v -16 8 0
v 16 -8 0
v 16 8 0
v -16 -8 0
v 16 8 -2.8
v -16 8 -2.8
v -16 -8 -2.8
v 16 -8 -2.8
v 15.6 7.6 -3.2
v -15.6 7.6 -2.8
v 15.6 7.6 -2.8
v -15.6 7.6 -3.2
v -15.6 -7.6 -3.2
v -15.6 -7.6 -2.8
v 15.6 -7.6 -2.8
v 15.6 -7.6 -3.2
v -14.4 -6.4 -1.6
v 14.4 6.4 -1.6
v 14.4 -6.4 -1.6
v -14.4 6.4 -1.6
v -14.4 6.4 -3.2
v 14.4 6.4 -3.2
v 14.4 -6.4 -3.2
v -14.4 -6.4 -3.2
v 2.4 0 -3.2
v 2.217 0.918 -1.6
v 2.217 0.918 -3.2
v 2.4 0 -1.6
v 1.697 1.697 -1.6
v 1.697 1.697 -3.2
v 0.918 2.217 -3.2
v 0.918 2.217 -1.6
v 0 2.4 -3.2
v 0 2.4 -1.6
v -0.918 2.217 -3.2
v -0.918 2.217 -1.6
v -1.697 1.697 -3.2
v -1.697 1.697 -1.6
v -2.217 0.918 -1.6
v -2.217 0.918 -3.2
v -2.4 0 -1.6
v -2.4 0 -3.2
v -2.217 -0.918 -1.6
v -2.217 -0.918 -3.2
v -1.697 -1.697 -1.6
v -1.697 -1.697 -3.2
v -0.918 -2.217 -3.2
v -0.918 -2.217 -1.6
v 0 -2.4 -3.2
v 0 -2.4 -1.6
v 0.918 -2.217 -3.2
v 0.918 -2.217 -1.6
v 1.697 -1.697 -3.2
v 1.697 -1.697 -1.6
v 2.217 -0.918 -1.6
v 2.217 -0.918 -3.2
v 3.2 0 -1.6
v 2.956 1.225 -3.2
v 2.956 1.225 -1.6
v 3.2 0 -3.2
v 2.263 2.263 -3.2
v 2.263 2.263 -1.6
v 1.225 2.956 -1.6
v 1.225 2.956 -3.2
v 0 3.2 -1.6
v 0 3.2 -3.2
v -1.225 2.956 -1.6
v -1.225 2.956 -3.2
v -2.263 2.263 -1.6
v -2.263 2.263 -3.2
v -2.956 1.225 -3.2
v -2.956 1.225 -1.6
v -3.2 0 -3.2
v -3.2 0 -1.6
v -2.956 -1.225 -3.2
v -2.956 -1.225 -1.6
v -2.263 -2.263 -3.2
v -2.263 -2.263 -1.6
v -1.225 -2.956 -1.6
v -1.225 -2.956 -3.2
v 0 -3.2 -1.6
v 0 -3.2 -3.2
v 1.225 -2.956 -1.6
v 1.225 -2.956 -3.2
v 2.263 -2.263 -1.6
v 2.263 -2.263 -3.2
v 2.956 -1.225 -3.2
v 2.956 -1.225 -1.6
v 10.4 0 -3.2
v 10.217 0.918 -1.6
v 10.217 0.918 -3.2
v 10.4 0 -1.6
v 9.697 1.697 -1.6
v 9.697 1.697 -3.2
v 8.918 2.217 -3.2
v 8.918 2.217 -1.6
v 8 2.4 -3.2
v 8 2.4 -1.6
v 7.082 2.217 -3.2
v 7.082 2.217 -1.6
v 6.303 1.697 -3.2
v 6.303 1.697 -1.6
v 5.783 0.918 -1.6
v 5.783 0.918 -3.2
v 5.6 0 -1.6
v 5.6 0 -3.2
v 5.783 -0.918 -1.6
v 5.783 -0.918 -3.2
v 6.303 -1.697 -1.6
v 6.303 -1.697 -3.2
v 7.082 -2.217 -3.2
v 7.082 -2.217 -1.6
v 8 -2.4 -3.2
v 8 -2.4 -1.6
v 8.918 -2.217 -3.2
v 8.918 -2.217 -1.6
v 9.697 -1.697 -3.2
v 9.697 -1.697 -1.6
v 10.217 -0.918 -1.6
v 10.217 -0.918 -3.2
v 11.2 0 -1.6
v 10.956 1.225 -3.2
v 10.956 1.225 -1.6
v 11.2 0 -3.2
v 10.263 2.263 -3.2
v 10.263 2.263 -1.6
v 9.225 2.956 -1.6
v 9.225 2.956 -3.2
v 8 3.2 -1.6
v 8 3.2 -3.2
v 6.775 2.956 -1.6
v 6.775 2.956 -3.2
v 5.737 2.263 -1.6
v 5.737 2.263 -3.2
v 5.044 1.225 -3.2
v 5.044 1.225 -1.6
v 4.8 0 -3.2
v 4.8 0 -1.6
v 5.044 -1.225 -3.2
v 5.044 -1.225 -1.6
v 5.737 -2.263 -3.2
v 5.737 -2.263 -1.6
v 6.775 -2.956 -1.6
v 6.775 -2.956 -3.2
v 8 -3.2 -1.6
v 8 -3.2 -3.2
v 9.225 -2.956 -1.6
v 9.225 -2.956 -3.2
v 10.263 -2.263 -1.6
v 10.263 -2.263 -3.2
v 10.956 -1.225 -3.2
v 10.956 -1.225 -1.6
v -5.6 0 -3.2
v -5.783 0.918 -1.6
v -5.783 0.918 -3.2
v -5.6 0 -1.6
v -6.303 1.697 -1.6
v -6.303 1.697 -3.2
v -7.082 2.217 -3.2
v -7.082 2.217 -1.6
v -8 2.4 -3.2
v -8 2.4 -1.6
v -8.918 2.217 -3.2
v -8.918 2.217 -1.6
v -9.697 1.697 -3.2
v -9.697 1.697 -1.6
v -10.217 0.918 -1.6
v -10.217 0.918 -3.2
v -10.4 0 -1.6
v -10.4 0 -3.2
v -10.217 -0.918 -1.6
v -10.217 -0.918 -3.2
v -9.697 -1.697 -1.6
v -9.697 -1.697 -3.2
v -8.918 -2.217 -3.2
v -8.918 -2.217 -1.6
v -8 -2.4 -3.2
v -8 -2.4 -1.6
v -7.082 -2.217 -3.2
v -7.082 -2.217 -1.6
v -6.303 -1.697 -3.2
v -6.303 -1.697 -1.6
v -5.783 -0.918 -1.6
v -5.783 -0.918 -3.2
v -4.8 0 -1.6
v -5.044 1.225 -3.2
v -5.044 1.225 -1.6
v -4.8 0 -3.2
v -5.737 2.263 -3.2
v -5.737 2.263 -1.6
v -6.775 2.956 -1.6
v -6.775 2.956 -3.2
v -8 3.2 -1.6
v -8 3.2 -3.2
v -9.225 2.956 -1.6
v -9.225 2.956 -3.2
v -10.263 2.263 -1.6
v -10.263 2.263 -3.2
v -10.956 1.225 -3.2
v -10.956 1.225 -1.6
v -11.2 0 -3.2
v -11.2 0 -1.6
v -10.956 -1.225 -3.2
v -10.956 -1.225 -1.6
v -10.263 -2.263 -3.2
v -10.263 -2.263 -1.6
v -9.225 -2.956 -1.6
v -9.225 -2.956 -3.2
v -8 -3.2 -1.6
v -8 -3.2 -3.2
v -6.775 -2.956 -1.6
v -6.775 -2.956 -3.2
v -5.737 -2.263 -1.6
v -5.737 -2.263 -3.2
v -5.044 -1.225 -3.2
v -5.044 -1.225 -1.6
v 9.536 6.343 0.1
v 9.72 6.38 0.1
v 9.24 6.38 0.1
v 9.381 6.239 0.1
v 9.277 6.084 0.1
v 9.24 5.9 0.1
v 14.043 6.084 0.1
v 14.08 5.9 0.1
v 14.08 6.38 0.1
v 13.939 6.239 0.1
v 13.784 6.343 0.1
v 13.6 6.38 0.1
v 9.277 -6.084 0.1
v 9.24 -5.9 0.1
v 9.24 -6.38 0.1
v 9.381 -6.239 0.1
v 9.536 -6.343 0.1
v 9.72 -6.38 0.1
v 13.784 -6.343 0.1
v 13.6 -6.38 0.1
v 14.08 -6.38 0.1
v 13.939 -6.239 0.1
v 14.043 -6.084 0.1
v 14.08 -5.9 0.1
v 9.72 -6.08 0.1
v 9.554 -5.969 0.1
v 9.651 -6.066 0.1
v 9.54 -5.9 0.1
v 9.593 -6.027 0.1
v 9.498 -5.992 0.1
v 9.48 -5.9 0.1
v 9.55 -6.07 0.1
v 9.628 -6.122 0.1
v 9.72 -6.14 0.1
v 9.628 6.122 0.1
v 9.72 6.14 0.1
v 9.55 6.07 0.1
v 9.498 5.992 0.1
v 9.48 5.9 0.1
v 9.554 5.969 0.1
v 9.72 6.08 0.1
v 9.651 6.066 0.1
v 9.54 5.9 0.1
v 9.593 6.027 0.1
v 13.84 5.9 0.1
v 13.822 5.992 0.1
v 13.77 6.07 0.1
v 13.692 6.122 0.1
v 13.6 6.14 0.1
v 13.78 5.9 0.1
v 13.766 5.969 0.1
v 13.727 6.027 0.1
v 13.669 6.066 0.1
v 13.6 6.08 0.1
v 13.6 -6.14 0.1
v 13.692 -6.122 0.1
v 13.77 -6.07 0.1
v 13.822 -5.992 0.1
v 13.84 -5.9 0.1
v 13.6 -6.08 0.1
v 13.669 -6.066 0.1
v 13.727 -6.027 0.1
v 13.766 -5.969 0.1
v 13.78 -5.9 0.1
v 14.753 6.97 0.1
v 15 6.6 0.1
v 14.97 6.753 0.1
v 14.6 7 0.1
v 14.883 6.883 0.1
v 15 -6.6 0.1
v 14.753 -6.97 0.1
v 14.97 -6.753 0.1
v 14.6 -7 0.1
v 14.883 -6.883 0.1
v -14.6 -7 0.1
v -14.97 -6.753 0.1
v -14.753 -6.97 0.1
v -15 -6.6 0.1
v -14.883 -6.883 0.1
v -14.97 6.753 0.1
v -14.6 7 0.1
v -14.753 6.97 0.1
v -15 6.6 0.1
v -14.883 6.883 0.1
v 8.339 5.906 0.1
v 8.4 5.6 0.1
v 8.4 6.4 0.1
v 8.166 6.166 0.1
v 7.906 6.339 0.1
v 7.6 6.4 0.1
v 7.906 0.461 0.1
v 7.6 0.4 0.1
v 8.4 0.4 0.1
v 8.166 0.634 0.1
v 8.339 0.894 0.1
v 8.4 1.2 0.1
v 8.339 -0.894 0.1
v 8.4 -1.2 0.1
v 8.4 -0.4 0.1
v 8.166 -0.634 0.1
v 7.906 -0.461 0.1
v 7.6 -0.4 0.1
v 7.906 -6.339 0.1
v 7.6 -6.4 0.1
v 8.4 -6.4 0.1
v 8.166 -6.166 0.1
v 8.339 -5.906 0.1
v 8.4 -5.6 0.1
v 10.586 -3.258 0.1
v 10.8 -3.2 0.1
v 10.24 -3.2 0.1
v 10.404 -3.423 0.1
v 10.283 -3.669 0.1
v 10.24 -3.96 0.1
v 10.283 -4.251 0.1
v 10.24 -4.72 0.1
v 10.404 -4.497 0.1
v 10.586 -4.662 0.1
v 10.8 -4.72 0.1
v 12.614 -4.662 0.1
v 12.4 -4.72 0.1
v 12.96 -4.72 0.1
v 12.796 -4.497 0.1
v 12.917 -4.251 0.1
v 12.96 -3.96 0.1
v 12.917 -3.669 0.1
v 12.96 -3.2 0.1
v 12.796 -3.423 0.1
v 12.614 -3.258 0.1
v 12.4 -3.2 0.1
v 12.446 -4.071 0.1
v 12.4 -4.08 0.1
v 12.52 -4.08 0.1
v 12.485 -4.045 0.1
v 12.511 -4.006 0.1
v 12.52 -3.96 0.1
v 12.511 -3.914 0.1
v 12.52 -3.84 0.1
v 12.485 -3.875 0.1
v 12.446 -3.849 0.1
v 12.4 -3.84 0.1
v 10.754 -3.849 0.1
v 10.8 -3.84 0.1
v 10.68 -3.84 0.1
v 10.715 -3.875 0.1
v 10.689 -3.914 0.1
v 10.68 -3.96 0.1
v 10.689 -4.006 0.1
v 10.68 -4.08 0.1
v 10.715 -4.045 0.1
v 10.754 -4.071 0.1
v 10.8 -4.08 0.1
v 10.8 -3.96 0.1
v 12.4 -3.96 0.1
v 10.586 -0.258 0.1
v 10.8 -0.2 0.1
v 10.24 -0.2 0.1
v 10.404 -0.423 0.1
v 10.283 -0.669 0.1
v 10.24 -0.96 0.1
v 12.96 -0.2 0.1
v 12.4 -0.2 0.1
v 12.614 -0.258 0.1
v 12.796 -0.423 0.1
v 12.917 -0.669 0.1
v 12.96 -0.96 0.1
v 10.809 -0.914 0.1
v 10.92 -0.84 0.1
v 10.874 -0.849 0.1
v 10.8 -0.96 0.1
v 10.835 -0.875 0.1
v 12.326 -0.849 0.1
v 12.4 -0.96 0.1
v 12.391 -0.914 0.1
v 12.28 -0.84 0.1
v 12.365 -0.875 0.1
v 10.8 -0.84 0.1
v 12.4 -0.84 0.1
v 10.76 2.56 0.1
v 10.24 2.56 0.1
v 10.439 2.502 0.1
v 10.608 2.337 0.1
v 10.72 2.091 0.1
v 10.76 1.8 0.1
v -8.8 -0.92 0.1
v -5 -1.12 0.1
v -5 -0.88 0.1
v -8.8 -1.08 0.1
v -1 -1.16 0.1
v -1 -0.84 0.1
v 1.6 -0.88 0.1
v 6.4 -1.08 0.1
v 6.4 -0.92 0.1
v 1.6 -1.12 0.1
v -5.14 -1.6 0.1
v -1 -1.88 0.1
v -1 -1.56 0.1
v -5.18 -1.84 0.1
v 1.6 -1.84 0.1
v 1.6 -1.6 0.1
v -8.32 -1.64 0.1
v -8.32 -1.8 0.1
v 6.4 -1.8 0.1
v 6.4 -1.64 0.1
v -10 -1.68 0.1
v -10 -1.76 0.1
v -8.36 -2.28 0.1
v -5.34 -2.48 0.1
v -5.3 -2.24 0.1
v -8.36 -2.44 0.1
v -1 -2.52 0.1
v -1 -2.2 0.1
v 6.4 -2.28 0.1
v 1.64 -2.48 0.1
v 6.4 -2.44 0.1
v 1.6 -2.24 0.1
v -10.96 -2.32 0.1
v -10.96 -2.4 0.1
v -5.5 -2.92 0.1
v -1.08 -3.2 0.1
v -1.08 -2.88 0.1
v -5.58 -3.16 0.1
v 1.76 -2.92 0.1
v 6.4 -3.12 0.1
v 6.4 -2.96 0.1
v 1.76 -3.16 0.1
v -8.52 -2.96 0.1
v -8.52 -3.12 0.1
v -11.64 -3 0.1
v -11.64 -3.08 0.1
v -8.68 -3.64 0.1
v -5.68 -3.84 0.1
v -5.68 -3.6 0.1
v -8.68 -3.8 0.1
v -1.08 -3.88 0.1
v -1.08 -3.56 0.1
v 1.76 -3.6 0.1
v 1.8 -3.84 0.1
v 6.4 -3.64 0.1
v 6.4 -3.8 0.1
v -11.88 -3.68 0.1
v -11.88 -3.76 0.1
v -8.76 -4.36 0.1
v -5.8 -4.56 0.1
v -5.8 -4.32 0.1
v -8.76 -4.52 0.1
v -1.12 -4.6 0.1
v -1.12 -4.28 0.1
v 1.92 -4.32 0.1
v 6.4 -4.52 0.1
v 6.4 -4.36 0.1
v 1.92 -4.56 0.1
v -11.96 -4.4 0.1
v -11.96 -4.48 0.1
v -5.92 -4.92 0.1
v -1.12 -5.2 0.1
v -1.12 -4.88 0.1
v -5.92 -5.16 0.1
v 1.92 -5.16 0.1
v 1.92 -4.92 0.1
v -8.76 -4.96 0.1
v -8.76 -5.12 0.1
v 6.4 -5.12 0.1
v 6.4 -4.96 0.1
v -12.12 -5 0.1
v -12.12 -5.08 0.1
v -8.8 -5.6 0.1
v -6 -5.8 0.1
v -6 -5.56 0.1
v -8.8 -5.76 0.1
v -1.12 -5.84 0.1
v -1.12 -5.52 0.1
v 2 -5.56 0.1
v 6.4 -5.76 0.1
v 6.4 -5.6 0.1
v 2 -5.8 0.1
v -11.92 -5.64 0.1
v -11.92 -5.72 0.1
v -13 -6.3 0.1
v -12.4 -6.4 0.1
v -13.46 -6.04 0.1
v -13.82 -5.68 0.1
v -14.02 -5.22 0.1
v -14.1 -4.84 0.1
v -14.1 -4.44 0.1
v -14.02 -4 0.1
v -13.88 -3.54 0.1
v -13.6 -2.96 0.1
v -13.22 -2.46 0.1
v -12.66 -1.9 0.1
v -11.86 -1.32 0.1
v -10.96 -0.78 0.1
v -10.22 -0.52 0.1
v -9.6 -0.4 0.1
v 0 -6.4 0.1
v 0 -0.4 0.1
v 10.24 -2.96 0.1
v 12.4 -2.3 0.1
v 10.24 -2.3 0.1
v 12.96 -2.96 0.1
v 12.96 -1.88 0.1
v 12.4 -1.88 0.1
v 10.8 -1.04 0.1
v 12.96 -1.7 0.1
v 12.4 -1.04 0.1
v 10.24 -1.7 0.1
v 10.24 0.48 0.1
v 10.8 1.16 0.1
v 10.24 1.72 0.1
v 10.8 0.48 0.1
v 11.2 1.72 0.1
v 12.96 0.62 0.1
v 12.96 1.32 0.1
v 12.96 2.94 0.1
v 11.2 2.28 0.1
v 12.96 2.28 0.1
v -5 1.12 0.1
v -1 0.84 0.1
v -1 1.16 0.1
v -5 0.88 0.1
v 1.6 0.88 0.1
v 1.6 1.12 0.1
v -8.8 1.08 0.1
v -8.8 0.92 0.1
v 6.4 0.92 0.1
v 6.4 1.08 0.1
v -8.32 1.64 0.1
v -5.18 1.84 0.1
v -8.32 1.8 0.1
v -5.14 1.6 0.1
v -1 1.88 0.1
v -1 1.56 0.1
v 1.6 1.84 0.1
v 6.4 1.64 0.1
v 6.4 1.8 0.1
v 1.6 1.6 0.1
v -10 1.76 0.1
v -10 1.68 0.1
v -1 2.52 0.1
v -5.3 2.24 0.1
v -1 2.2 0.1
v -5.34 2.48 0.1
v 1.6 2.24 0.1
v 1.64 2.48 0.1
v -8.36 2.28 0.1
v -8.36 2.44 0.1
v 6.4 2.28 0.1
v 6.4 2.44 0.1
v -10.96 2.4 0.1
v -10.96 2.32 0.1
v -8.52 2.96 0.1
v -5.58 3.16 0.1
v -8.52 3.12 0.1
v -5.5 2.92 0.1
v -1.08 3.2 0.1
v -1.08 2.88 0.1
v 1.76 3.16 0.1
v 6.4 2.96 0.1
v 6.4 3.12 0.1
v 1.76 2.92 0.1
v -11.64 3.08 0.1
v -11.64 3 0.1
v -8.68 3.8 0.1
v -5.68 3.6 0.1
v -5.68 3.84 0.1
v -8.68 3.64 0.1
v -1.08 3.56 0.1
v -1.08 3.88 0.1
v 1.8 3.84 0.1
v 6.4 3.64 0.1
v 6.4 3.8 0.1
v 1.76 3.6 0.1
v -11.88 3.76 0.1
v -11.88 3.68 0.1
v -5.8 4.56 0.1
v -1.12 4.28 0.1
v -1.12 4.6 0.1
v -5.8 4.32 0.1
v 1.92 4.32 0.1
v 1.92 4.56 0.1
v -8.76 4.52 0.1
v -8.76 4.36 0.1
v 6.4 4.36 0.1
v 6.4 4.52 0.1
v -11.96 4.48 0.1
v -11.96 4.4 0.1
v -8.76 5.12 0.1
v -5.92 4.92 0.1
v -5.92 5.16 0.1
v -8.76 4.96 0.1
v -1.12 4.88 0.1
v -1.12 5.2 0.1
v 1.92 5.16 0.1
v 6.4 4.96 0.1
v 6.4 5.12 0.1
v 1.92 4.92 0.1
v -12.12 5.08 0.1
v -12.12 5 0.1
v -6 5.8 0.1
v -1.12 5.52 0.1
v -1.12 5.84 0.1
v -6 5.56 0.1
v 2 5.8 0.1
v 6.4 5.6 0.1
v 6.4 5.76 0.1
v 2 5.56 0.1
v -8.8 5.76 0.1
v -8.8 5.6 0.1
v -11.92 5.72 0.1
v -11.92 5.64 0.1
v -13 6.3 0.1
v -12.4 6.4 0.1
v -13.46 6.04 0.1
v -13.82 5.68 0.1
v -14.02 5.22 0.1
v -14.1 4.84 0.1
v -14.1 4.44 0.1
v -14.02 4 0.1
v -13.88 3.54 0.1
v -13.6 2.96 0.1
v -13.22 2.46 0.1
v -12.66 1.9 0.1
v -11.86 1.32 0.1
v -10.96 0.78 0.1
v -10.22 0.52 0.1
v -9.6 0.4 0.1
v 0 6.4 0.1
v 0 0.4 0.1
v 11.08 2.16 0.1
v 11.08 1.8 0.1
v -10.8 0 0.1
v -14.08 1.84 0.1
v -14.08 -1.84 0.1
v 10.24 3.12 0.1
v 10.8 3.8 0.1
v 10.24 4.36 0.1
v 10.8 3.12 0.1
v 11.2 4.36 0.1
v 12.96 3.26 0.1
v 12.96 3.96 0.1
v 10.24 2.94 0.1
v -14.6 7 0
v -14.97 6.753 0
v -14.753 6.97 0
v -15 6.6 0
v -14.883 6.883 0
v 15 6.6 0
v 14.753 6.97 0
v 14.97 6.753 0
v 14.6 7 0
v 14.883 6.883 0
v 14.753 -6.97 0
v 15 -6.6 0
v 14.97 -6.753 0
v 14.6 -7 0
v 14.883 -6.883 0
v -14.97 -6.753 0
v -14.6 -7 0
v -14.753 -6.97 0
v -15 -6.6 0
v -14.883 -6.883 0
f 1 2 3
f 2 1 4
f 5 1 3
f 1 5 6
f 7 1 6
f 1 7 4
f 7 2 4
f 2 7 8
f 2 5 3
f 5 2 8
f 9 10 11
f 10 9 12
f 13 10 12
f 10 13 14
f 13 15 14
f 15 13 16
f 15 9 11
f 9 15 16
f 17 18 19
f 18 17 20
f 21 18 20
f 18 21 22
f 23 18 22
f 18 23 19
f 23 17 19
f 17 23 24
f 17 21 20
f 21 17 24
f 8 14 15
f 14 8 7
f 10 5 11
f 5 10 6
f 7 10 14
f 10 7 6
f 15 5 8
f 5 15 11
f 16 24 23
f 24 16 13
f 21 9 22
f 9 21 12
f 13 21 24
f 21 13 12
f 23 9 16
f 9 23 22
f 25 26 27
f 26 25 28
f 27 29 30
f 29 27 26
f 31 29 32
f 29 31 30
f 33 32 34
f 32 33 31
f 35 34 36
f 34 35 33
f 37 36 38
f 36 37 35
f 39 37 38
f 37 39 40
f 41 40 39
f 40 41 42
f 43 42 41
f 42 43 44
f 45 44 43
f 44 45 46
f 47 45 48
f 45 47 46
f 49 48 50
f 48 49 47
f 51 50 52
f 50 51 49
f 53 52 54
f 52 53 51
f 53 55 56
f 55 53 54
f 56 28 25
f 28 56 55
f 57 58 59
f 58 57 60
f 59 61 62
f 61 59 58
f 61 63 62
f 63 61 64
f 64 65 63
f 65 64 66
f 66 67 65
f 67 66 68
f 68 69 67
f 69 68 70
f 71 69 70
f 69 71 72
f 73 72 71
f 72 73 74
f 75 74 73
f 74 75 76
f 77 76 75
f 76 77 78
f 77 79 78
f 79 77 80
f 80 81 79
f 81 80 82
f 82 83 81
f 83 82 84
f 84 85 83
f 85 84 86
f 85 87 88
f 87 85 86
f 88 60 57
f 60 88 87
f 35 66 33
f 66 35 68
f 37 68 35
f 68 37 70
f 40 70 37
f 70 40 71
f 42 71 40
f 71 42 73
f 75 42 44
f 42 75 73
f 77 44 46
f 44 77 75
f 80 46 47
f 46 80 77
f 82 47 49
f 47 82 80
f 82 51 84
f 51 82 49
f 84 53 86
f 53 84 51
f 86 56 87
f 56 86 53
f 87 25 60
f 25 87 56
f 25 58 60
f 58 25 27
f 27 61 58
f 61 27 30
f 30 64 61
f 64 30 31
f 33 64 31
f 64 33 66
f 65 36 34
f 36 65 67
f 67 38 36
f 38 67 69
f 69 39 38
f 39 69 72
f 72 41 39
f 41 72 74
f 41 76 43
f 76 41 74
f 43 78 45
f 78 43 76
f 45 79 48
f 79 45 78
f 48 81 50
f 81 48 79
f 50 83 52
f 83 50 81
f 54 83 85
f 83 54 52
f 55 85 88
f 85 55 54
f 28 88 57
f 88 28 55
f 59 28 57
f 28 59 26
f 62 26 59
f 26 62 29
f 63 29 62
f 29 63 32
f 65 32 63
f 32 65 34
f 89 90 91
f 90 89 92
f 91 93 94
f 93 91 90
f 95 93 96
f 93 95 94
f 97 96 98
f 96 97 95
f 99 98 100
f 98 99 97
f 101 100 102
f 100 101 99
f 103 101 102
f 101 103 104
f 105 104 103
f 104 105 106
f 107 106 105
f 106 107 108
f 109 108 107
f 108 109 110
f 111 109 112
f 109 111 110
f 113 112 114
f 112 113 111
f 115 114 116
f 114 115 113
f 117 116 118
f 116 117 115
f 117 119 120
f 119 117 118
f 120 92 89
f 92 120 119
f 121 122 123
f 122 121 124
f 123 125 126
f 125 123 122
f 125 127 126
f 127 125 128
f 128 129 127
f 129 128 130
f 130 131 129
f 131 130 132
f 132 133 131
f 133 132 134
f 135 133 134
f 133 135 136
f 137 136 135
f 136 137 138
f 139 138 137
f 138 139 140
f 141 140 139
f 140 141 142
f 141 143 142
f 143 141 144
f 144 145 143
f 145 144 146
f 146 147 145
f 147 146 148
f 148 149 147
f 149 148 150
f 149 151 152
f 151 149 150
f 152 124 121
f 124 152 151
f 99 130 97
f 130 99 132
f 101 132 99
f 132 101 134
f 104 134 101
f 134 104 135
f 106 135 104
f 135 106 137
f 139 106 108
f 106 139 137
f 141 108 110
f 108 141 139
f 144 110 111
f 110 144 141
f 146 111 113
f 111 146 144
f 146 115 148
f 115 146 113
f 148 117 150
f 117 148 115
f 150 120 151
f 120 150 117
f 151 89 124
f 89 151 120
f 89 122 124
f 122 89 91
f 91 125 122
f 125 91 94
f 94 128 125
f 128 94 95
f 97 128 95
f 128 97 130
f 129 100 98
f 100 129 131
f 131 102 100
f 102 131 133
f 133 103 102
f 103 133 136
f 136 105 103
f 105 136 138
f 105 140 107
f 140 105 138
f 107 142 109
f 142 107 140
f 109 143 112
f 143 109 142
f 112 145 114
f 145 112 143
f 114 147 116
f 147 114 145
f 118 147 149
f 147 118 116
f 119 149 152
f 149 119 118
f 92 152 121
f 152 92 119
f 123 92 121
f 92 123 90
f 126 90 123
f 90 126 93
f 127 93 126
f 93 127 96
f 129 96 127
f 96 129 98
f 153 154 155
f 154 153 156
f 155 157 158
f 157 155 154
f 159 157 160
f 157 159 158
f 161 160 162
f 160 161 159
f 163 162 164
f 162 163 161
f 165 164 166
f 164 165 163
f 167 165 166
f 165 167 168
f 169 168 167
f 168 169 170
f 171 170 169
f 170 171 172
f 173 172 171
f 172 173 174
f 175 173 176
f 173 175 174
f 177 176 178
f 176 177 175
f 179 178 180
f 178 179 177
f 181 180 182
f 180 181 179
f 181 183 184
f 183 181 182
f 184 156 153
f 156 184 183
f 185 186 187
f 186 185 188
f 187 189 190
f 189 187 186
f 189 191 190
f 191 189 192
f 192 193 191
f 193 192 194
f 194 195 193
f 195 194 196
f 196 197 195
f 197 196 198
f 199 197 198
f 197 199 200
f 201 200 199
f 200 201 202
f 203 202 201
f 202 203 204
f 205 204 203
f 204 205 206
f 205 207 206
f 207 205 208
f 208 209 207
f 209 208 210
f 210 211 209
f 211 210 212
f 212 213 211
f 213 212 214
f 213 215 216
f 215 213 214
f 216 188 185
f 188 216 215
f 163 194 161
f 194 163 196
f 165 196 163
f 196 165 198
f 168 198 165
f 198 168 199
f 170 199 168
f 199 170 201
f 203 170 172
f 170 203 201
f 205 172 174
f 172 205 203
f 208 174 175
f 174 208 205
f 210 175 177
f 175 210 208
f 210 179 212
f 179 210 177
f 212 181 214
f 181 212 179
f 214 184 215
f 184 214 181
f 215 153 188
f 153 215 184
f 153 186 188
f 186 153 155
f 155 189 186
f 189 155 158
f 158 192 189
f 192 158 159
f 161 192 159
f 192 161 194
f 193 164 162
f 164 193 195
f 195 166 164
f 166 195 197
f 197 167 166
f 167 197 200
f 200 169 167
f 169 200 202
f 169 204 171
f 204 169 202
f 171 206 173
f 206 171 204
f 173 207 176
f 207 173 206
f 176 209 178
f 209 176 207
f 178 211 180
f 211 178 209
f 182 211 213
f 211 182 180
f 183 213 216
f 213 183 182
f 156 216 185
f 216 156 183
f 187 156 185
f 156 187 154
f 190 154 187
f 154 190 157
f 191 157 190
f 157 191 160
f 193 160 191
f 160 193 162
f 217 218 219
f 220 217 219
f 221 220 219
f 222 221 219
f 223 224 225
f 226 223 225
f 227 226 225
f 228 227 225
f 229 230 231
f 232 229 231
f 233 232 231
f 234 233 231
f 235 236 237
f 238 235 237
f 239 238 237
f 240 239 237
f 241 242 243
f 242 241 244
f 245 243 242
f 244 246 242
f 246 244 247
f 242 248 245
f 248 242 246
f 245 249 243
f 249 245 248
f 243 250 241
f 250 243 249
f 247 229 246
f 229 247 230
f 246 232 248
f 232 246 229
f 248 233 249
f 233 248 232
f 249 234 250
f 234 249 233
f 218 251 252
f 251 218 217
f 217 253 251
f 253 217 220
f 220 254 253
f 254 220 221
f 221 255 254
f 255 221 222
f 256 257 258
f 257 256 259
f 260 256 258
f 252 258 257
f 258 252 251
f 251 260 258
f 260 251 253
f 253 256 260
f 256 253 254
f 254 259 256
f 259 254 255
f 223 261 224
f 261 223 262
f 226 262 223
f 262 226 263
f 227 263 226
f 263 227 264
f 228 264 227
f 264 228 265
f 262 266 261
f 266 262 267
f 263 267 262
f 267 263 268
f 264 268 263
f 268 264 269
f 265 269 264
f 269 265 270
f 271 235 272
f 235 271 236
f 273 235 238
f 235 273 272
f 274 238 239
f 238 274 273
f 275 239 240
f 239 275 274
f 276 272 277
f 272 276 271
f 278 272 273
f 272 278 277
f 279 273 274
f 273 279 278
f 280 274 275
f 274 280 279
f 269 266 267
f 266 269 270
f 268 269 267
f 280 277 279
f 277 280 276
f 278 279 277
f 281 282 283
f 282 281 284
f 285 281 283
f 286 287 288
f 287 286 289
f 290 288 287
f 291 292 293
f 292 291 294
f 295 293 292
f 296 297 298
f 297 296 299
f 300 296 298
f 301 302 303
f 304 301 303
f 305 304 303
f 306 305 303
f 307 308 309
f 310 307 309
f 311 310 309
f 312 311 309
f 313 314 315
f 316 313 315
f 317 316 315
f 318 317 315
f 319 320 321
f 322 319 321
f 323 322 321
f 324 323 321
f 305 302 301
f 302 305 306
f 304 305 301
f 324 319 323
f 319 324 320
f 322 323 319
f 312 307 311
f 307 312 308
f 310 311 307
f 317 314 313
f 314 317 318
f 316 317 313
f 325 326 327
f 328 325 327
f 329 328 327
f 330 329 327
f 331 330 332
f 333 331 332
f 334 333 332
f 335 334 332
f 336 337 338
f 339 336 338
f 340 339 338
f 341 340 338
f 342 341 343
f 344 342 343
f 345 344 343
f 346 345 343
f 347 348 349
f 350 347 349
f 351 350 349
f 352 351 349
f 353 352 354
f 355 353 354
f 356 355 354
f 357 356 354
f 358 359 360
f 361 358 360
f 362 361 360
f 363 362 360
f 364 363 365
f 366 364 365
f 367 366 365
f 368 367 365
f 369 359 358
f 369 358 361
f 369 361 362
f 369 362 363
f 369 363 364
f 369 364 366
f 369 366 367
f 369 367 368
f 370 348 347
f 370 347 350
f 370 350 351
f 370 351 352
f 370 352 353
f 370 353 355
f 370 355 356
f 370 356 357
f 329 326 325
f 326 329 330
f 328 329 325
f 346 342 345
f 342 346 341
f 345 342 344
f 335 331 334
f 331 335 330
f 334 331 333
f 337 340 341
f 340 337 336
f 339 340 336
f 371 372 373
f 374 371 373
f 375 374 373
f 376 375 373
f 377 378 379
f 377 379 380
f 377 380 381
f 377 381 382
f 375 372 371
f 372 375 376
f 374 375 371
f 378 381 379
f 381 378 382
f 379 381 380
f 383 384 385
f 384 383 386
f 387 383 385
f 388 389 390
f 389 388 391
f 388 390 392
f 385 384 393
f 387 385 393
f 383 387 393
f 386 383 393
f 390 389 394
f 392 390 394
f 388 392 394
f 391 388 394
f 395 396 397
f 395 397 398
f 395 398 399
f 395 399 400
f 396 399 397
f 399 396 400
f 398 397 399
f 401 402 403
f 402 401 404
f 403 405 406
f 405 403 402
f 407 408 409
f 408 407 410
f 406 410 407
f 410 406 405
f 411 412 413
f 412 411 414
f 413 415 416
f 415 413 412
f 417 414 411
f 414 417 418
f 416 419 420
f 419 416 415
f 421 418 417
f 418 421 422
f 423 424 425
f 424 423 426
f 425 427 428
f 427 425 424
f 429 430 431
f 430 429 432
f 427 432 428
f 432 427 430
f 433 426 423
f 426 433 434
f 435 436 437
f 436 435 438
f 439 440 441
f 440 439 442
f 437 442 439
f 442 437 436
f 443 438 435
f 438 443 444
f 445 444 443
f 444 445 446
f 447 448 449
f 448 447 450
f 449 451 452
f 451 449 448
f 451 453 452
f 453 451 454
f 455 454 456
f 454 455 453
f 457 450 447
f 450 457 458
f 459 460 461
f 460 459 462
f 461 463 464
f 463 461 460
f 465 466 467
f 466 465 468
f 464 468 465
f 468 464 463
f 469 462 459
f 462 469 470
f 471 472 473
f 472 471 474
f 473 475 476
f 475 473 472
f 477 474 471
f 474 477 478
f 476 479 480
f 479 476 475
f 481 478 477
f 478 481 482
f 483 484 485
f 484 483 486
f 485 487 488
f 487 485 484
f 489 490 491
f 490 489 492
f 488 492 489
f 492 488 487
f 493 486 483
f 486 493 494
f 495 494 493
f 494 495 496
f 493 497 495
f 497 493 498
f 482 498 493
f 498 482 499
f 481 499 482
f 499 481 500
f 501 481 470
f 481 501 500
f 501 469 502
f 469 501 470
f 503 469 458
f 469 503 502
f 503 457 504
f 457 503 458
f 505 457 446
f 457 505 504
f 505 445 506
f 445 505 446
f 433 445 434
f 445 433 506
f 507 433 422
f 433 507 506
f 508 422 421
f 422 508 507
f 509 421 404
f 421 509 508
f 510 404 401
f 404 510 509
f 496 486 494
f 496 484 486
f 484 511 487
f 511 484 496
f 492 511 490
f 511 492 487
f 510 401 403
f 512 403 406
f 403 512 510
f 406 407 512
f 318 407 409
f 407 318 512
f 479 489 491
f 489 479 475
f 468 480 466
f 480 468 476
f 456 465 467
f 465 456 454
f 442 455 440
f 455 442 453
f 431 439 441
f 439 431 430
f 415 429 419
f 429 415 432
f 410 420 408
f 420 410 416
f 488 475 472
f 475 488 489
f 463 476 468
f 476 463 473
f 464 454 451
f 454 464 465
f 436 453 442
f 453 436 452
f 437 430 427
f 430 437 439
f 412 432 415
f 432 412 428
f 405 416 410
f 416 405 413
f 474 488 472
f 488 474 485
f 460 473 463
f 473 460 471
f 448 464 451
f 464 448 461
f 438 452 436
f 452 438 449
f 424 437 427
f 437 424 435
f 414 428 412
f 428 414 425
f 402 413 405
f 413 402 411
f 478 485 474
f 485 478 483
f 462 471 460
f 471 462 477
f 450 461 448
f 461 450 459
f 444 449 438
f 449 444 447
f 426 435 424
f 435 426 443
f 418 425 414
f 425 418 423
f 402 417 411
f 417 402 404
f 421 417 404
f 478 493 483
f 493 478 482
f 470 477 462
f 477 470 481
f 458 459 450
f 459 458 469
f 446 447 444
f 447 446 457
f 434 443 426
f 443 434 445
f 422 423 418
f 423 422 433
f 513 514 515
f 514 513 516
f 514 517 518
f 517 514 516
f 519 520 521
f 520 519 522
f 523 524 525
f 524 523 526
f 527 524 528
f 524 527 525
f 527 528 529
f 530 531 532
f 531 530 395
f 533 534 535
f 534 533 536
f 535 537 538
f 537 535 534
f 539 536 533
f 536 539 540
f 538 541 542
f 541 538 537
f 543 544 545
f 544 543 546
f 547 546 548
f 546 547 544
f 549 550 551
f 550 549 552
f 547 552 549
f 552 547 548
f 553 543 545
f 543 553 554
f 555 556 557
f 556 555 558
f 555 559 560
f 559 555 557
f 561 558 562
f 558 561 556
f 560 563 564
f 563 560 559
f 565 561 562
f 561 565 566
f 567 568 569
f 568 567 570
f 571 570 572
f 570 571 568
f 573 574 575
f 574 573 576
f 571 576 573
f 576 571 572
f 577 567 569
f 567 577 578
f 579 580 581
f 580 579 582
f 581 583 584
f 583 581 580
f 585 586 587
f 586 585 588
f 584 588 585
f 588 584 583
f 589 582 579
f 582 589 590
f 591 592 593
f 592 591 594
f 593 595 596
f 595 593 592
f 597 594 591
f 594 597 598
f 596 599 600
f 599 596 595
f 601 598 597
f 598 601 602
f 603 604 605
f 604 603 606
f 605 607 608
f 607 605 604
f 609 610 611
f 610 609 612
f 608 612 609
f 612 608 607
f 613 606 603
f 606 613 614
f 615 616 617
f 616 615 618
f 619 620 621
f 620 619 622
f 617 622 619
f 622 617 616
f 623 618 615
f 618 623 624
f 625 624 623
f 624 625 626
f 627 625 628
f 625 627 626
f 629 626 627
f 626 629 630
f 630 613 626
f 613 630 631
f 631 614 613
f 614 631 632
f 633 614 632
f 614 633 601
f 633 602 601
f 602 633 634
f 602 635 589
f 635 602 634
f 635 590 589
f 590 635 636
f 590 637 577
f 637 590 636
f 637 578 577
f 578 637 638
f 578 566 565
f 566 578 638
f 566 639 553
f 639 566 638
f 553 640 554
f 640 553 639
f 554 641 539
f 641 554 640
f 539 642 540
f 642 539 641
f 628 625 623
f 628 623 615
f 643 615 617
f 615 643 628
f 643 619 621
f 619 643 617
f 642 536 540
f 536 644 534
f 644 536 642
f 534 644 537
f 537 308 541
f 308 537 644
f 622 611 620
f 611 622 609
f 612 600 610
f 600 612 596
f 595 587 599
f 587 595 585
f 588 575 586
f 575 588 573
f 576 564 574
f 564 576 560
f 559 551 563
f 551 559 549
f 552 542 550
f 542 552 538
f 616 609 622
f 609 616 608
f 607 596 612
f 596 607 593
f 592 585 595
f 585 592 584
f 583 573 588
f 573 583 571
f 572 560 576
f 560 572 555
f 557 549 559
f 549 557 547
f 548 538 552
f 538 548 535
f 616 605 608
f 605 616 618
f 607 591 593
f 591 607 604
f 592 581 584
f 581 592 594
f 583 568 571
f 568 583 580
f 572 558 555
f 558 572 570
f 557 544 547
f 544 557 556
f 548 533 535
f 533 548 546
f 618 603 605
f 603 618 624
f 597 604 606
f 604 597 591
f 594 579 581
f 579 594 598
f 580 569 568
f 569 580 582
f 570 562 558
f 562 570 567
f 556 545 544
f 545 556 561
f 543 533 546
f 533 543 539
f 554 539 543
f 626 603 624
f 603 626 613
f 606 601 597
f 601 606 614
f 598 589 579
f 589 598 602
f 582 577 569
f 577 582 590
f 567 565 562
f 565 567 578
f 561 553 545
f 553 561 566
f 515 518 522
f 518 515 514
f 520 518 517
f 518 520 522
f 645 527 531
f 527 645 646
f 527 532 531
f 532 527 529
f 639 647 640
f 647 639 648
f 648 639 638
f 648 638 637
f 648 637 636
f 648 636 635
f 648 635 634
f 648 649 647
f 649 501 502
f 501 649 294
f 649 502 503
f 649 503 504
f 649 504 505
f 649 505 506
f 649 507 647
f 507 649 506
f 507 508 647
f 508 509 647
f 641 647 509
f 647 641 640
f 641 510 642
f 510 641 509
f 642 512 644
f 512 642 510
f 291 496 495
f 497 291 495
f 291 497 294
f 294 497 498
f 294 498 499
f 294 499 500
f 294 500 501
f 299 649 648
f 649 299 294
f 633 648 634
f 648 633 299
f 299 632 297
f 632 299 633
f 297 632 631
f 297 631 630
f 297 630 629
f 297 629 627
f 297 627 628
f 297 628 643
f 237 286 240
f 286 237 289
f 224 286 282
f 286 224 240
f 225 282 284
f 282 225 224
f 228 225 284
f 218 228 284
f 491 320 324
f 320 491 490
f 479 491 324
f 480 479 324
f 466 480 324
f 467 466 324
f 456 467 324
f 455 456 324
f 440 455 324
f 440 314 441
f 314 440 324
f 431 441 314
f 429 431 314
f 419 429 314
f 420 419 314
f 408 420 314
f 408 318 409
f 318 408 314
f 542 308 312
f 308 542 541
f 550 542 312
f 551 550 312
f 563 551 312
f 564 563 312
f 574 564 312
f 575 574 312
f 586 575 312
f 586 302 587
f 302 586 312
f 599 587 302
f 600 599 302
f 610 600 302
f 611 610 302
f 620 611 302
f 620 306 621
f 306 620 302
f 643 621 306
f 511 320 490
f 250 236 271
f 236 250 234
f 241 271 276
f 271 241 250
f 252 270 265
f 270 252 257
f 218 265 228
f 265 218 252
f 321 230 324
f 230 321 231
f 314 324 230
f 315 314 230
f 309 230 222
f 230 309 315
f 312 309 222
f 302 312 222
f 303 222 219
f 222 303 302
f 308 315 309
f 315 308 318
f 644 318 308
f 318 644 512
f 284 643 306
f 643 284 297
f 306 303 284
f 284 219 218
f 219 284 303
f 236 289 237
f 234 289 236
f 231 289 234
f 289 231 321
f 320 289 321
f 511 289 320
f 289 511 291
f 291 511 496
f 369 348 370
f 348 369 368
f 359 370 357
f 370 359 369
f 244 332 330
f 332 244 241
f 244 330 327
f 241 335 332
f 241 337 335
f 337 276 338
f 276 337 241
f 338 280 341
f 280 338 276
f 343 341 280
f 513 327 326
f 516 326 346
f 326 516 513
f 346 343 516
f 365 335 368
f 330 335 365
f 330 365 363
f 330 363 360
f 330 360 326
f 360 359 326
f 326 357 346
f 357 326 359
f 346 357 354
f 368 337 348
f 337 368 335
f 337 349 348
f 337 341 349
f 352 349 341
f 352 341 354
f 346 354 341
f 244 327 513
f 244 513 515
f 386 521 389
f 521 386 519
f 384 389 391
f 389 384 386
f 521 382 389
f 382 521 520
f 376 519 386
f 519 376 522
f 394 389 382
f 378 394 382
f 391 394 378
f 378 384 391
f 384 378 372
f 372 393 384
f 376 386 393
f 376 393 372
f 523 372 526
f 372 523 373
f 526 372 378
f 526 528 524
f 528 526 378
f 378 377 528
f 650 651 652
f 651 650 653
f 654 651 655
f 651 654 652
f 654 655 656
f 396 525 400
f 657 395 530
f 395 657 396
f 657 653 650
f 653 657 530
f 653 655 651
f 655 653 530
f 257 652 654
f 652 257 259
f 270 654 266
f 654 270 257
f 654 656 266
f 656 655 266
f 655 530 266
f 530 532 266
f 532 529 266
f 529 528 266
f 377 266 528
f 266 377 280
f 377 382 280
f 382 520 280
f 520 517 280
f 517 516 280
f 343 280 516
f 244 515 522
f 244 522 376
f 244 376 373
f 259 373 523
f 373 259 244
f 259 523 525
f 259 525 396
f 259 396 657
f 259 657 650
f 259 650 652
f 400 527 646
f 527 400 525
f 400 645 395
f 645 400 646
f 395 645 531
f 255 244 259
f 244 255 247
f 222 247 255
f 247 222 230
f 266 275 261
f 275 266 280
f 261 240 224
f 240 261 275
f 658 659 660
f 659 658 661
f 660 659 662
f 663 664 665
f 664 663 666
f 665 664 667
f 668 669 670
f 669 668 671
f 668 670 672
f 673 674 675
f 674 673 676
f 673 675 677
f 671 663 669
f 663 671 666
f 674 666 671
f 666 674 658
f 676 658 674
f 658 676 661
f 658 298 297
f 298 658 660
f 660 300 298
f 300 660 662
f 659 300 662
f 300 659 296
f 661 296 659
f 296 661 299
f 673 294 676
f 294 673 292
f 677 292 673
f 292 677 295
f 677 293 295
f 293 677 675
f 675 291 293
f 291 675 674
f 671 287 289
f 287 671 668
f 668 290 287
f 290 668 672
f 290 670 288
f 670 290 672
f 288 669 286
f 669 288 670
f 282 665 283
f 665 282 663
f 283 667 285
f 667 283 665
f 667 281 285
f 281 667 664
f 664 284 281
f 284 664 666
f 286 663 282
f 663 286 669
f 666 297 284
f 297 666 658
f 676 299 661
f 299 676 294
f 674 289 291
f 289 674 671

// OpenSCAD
use <../lib.scad>
use <6278968c.scad>
use <87079.scad>
function ldraw_lib__87079d0f() = [
// 0 Tile  2 x  4 with Car Radiator and Black "OLD 717" License Plate Sticker
// 0 Name: 87079d0f.dat
// 0 Author: Evert-Jan Boer [ejboer]
// 0 !LDRAW_ORG Shortcut UPDATE 2024-11
// 0 !LICENSE Licensed under CC BY 4.0 : see CAreadme.txt
// 
// 0 BFC CERTIFY CCW
  [0,"BFC","CERTIFY"],
  [0,"BFC","CCW"],
// 
// 0 !CATEGORY Sticker Shortcut
// 0 !KEYWORDS Bricklink 87079pb0987, Set 75957
// 
// 0 !HISTORY 2024-12-30 [OrionP] Official Update 2024-11
// 
// 1 16 0 0 0 1 0 0 0 1 0 0 0 1 87079.dat
  [1,16,0,0,0,1,0,0,0,1,0,0,0,1, ldraw_lib__87079()],
// 1 16 0 0 0 0 0 -1 0 1 0 1 0 0 6278968c.dat
  [1,16,0,0,0,0,0,-1,0,1,0,1,0,0, ldraw_lib__6278968c()],
];
module ldraw_lib__87079d0f(step=0, col=false, unit=2/5, alt=false, line=0.2, solid=!$preview)
    makepoly(ldraw_lib__87079d0f(), step=step, col=col, unit=unit, alt=alt, line=line, solid=solid);
ldraw_lib__87079d0f(line=0.2);
